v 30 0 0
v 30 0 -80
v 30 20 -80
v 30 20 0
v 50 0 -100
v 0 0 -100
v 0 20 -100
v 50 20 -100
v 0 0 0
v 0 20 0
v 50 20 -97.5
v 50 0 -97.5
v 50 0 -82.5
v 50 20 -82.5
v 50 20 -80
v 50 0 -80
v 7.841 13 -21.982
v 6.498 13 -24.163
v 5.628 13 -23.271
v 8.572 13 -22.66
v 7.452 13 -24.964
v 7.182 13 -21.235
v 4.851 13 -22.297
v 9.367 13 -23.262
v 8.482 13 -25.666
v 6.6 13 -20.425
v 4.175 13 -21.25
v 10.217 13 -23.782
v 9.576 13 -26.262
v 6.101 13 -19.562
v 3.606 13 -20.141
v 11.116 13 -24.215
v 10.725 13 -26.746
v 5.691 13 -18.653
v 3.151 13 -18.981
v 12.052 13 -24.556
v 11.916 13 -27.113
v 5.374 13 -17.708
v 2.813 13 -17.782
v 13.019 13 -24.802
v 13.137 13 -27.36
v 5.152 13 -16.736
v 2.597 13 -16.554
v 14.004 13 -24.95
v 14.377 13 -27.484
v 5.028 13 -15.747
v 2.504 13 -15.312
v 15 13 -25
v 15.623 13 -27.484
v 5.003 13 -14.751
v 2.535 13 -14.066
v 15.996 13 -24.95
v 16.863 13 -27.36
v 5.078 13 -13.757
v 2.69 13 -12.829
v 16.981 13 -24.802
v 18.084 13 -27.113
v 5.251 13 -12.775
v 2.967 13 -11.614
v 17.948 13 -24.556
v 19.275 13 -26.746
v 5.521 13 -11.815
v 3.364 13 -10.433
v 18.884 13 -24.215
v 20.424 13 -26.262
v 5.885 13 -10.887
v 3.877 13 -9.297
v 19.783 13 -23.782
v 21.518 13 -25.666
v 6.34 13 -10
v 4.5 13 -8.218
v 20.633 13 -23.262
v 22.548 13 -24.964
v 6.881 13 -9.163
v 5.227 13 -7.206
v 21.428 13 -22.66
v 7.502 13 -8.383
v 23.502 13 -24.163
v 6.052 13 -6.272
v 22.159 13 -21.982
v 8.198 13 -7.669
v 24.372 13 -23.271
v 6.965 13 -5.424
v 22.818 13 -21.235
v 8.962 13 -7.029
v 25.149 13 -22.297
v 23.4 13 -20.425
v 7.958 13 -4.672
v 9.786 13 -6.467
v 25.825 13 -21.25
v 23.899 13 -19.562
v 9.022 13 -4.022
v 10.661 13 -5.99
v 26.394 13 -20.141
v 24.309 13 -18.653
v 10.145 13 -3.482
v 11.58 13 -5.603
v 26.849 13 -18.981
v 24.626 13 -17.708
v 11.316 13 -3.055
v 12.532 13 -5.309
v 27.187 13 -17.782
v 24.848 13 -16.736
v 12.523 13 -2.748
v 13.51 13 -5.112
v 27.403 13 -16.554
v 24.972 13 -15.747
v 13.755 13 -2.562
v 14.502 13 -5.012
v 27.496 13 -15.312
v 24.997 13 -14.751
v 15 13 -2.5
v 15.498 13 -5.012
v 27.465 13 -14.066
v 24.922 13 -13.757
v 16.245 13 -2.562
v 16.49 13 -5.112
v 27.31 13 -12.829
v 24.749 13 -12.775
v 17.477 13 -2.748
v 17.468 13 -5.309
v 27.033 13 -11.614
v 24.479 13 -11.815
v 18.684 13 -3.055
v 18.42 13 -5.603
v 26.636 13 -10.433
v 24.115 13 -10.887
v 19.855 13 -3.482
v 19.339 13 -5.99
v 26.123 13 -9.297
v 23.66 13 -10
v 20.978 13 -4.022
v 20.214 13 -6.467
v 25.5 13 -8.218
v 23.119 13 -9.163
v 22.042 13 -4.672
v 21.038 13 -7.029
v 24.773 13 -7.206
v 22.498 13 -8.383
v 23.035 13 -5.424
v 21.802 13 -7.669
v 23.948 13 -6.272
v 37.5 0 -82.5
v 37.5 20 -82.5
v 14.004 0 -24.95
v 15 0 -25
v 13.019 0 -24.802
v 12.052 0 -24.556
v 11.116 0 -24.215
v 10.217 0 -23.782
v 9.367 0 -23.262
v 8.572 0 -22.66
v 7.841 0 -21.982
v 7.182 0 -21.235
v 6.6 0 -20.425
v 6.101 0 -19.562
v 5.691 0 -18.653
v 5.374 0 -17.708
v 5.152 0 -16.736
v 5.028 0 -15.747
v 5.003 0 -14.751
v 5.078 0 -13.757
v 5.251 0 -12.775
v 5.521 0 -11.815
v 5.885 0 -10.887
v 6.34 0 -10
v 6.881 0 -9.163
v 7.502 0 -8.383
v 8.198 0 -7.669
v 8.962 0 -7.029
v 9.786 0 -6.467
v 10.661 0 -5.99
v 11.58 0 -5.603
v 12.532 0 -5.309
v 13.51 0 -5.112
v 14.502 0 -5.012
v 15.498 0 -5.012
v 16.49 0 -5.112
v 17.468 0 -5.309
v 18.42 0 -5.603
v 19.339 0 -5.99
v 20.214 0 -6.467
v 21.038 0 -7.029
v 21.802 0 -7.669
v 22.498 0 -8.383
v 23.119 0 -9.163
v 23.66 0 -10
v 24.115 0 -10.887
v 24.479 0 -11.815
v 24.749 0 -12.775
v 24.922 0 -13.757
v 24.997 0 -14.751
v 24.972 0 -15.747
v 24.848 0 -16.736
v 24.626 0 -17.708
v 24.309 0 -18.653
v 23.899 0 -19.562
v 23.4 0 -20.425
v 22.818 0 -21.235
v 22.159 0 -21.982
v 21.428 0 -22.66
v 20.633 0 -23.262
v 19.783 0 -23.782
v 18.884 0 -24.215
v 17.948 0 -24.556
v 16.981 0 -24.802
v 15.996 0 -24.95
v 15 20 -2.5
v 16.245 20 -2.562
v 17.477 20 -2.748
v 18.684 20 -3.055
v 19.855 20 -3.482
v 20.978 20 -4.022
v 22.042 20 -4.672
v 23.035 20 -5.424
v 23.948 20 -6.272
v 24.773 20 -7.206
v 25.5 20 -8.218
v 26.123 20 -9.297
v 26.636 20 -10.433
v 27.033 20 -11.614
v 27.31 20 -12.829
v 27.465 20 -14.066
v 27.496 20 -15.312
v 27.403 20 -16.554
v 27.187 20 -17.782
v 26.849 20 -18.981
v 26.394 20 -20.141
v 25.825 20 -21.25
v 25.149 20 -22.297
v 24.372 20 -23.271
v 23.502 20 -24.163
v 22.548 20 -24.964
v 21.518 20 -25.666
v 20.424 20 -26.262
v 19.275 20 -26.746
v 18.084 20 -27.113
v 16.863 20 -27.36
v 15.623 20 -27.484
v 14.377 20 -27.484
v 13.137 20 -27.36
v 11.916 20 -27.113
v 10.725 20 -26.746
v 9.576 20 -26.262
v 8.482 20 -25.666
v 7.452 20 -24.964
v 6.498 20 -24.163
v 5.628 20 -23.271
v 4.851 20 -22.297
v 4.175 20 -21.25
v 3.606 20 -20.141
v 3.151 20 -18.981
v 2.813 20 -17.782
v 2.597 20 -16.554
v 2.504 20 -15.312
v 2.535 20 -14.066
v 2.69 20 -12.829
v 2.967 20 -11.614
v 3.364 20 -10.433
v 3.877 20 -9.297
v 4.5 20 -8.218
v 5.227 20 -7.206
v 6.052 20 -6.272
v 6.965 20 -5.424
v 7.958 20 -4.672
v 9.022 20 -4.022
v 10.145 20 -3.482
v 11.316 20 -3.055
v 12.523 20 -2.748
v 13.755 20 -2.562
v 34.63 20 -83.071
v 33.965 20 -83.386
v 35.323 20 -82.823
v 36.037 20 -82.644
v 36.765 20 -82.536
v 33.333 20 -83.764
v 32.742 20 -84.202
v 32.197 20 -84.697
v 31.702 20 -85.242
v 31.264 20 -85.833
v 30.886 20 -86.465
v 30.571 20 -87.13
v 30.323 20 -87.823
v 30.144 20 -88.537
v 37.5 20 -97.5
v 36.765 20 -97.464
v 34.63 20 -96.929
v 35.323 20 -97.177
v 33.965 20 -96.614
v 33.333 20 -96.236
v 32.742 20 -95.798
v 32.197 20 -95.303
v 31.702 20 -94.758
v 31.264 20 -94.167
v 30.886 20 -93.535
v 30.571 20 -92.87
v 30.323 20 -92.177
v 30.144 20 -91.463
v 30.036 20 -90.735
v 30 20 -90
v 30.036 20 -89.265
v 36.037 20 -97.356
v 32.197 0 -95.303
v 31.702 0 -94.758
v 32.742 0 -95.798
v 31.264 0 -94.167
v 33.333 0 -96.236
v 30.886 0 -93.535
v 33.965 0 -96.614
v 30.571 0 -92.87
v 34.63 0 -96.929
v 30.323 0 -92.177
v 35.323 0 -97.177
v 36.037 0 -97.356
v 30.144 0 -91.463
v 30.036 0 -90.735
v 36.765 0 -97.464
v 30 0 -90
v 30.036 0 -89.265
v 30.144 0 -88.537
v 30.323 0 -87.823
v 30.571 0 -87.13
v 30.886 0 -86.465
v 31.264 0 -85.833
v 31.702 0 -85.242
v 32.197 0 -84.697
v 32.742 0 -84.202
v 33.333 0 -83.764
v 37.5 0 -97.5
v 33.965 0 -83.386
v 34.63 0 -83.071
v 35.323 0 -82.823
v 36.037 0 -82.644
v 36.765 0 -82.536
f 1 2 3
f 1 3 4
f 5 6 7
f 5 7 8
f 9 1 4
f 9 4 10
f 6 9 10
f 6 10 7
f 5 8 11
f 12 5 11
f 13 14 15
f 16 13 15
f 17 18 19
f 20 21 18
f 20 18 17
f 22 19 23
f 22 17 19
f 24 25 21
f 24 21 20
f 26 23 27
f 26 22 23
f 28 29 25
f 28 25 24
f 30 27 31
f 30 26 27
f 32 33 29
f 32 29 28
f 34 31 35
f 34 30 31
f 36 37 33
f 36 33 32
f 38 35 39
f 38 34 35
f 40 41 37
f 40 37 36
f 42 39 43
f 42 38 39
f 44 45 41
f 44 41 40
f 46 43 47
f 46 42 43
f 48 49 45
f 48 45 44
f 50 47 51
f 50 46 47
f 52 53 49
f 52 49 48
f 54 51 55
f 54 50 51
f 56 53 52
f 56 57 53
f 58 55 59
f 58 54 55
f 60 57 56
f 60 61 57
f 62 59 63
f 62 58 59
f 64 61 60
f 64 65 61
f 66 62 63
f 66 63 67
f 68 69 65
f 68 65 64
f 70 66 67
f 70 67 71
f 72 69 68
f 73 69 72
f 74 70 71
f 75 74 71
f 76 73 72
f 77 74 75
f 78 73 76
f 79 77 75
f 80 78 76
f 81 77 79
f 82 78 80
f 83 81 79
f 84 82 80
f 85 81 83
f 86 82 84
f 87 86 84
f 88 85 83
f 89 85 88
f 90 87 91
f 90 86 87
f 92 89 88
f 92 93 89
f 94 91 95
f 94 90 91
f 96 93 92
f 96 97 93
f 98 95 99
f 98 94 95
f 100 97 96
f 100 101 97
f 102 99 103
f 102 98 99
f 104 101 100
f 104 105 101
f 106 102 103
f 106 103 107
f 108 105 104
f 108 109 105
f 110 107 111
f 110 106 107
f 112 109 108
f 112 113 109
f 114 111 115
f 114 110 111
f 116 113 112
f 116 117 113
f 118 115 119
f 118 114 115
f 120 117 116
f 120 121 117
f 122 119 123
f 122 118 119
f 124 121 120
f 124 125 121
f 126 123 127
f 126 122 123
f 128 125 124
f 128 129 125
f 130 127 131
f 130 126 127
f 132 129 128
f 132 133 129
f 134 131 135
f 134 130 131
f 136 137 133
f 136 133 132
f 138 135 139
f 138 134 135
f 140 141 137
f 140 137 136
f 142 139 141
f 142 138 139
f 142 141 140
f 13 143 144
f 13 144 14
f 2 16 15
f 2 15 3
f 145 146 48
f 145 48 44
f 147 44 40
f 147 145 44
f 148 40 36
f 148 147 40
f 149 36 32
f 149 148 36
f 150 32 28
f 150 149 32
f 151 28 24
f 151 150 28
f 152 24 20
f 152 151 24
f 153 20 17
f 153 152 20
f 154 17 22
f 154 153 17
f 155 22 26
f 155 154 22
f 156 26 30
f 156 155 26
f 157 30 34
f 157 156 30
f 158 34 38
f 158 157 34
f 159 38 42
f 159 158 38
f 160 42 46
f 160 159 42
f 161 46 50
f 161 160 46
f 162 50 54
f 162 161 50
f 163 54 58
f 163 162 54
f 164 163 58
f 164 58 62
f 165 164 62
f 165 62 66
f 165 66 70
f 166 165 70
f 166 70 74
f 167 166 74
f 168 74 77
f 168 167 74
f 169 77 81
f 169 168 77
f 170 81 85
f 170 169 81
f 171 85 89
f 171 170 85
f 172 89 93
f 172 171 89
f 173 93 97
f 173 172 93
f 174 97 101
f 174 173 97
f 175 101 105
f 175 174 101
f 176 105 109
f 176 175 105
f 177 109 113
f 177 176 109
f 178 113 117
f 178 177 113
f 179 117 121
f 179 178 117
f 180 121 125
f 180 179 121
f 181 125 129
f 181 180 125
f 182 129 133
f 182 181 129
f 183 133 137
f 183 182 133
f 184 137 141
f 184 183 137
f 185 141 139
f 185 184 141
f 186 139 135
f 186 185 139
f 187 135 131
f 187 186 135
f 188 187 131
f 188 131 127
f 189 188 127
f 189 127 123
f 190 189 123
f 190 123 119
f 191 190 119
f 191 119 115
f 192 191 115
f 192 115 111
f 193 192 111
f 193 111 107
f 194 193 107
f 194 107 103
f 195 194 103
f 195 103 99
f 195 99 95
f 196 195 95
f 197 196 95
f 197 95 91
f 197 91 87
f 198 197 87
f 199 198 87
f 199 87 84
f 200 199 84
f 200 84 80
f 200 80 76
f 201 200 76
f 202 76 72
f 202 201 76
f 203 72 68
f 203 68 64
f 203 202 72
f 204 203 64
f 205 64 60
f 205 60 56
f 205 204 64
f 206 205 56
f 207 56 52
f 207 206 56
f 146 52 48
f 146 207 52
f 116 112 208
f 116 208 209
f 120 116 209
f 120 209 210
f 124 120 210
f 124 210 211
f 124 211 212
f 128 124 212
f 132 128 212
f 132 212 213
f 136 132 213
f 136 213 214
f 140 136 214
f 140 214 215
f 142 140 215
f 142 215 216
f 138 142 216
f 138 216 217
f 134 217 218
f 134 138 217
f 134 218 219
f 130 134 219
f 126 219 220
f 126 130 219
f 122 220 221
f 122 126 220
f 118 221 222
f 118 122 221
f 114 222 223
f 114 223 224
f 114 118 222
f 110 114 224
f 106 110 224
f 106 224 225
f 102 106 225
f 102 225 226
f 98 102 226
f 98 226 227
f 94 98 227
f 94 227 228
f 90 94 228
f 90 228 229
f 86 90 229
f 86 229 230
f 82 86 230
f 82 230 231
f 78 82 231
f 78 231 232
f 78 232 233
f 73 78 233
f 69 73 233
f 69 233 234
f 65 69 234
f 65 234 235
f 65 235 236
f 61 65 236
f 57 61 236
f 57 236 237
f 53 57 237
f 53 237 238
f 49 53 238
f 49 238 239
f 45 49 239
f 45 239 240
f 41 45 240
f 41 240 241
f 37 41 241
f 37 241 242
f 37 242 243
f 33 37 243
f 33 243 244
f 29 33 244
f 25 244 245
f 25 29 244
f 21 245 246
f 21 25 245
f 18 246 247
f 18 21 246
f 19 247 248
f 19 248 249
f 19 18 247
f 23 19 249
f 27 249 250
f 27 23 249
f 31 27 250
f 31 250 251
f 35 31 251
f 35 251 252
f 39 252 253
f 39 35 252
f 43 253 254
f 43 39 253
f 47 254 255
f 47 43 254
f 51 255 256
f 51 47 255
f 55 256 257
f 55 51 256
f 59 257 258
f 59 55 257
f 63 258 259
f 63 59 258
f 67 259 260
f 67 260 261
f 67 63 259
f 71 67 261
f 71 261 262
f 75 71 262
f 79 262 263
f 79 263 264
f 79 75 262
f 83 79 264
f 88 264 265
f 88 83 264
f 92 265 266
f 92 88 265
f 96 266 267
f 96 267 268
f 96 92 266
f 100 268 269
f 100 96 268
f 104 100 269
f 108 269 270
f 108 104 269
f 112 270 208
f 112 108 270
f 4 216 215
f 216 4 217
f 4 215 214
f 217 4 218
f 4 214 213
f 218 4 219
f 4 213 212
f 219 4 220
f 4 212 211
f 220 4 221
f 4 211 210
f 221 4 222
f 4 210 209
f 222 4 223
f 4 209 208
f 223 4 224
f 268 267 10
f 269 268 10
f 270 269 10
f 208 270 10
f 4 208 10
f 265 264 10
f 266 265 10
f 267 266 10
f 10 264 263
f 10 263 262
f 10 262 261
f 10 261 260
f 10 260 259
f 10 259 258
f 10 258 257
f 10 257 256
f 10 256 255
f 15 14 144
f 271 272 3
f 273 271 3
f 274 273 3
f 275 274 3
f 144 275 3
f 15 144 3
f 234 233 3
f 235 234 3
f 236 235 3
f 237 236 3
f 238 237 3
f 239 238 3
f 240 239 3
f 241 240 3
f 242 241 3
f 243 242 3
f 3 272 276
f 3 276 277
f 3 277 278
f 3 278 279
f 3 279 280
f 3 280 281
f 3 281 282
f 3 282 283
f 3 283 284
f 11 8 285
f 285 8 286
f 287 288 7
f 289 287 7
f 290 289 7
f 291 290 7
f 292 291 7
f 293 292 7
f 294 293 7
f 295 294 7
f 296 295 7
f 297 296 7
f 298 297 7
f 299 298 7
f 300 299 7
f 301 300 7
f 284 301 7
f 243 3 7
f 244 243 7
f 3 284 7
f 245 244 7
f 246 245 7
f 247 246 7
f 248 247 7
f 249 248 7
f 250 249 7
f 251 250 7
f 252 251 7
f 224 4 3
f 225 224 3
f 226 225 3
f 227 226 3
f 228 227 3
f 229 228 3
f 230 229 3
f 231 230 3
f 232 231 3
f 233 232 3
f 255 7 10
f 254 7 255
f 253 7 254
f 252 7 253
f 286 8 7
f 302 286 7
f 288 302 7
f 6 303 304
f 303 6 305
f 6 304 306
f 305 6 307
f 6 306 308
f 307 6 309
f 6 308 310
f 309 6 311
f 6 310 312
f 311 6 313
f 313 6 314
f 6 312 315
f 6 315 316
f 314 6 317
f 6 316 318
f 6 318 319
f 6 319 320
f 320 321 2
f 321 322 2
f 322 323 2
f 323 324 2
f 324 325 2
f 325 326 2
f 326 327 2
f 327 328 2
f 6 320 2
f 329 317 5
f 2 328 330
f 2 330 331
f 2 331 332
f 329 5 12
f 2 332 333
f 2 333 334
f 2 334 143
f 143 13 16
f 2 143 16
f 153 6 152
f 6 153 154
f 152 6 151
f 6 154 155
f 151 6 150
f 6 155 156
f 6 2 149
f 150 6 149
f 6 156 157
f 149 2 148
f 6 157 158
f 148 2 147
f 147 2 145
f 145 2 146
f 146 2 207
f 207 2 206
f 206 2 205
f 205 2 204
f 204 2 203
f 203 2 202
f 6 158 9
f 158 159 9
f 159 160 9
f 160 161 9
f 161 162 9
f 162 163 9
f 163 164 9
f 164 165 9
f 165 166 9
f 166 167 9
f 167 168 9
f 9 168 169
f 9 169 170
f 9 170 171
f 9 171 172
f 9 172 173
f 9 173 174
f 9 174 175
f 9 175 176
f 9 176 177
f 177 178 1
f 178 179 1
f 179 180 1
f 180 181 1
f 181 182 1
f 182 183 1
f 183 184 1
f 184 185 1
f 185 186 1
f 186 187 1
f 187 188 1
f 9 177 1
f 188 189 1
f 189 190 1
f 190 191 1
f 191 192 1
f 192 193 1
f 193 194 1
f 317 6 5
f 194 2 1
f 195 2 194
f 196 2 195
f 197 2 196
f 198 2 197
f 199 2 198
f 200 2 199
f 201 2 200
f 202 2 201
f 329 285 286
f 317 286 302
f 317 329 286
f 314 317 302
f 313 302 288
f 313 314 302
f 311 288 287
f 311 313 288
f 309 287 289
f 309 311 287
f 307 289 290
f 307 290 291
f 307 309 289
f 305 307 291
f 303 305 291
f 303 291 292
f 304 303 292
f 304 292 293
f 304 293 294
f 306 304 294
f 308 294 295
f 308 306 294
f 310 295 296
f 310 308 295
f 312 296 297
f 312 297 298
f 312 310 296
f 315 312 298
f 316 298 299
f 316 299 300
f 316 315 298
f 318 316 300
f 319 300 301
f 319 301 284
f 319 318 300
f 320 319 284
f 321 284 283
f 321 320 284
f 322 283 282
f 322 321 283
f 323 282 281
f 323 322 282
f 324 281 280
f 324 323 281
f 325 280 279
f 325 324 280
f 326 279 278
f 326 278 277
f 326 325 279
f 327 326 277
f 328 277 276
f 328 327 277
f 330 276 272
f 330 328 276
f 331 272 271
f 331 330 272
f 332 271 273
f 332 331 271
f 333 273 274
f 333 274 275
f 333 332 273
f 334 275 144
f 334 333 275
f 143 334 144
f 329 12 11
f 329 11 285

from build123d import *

# Parameters (mm, degrees)
SKETCH1_R           = 12.5
BOSS_EXTRUDE1_DEPTH = 20
SKETCH1_4_R         = 12.5
SKETCH1_4_R_2       = 10
BOSS_EXTRUDE2_DEPTH = 13


with BuildPart() as part:
    # Sketch1 → Boss-Extrude1 (new body)
    with BuildSketch(Plane(origin=(0, 0, 0), x_dir=(1, 0, 0), z_dir=(0, 1, 0))):
        with BuildLine():
            ThreePointArc((37.5, 82.5), (30, 90), (37.5, 97.5))
            Line((37.5, 97.5), (50, 97.5))
            Line((50, 97.5), (50, 100))
            Line((50, 100), (30, 100))
            Line((30, 100), (0, 100))
            Line((0, 100), (0, 0))
            Line((0, 0), (30, 0))
            Line((30, 0), (30, 80))
            Line((30, 80), (50, 80))
            Line((50, 80), (50, 82.5))
            Line((50, 82.5), (37.5, 82.5))
        make_face()
        with Locations((15, 15)):
            Circle(SKETCH1_R, mode=Mode.SUBTRACT)
    extrude(amount=BOSS_EXTRUDE1_DEPTH)

    # Sketch1<4> → Boss-Extrude2 (add)
    with BuildSketch(Plane(origin=(0, 0, 0), x_dir=(1, 0, 0), z_dir=(0, 1, 0))):
        with Locations((15, 15)):
            Circle(SKETCH1_4_R)
        with Locations((15, 15)):
            Circle(SKETCH1_4_R_2, mode=Mode.SUBTRACT)
    extrude(amount=BOSS_EXTRUDE2_DEPTH)


solid = part.part
